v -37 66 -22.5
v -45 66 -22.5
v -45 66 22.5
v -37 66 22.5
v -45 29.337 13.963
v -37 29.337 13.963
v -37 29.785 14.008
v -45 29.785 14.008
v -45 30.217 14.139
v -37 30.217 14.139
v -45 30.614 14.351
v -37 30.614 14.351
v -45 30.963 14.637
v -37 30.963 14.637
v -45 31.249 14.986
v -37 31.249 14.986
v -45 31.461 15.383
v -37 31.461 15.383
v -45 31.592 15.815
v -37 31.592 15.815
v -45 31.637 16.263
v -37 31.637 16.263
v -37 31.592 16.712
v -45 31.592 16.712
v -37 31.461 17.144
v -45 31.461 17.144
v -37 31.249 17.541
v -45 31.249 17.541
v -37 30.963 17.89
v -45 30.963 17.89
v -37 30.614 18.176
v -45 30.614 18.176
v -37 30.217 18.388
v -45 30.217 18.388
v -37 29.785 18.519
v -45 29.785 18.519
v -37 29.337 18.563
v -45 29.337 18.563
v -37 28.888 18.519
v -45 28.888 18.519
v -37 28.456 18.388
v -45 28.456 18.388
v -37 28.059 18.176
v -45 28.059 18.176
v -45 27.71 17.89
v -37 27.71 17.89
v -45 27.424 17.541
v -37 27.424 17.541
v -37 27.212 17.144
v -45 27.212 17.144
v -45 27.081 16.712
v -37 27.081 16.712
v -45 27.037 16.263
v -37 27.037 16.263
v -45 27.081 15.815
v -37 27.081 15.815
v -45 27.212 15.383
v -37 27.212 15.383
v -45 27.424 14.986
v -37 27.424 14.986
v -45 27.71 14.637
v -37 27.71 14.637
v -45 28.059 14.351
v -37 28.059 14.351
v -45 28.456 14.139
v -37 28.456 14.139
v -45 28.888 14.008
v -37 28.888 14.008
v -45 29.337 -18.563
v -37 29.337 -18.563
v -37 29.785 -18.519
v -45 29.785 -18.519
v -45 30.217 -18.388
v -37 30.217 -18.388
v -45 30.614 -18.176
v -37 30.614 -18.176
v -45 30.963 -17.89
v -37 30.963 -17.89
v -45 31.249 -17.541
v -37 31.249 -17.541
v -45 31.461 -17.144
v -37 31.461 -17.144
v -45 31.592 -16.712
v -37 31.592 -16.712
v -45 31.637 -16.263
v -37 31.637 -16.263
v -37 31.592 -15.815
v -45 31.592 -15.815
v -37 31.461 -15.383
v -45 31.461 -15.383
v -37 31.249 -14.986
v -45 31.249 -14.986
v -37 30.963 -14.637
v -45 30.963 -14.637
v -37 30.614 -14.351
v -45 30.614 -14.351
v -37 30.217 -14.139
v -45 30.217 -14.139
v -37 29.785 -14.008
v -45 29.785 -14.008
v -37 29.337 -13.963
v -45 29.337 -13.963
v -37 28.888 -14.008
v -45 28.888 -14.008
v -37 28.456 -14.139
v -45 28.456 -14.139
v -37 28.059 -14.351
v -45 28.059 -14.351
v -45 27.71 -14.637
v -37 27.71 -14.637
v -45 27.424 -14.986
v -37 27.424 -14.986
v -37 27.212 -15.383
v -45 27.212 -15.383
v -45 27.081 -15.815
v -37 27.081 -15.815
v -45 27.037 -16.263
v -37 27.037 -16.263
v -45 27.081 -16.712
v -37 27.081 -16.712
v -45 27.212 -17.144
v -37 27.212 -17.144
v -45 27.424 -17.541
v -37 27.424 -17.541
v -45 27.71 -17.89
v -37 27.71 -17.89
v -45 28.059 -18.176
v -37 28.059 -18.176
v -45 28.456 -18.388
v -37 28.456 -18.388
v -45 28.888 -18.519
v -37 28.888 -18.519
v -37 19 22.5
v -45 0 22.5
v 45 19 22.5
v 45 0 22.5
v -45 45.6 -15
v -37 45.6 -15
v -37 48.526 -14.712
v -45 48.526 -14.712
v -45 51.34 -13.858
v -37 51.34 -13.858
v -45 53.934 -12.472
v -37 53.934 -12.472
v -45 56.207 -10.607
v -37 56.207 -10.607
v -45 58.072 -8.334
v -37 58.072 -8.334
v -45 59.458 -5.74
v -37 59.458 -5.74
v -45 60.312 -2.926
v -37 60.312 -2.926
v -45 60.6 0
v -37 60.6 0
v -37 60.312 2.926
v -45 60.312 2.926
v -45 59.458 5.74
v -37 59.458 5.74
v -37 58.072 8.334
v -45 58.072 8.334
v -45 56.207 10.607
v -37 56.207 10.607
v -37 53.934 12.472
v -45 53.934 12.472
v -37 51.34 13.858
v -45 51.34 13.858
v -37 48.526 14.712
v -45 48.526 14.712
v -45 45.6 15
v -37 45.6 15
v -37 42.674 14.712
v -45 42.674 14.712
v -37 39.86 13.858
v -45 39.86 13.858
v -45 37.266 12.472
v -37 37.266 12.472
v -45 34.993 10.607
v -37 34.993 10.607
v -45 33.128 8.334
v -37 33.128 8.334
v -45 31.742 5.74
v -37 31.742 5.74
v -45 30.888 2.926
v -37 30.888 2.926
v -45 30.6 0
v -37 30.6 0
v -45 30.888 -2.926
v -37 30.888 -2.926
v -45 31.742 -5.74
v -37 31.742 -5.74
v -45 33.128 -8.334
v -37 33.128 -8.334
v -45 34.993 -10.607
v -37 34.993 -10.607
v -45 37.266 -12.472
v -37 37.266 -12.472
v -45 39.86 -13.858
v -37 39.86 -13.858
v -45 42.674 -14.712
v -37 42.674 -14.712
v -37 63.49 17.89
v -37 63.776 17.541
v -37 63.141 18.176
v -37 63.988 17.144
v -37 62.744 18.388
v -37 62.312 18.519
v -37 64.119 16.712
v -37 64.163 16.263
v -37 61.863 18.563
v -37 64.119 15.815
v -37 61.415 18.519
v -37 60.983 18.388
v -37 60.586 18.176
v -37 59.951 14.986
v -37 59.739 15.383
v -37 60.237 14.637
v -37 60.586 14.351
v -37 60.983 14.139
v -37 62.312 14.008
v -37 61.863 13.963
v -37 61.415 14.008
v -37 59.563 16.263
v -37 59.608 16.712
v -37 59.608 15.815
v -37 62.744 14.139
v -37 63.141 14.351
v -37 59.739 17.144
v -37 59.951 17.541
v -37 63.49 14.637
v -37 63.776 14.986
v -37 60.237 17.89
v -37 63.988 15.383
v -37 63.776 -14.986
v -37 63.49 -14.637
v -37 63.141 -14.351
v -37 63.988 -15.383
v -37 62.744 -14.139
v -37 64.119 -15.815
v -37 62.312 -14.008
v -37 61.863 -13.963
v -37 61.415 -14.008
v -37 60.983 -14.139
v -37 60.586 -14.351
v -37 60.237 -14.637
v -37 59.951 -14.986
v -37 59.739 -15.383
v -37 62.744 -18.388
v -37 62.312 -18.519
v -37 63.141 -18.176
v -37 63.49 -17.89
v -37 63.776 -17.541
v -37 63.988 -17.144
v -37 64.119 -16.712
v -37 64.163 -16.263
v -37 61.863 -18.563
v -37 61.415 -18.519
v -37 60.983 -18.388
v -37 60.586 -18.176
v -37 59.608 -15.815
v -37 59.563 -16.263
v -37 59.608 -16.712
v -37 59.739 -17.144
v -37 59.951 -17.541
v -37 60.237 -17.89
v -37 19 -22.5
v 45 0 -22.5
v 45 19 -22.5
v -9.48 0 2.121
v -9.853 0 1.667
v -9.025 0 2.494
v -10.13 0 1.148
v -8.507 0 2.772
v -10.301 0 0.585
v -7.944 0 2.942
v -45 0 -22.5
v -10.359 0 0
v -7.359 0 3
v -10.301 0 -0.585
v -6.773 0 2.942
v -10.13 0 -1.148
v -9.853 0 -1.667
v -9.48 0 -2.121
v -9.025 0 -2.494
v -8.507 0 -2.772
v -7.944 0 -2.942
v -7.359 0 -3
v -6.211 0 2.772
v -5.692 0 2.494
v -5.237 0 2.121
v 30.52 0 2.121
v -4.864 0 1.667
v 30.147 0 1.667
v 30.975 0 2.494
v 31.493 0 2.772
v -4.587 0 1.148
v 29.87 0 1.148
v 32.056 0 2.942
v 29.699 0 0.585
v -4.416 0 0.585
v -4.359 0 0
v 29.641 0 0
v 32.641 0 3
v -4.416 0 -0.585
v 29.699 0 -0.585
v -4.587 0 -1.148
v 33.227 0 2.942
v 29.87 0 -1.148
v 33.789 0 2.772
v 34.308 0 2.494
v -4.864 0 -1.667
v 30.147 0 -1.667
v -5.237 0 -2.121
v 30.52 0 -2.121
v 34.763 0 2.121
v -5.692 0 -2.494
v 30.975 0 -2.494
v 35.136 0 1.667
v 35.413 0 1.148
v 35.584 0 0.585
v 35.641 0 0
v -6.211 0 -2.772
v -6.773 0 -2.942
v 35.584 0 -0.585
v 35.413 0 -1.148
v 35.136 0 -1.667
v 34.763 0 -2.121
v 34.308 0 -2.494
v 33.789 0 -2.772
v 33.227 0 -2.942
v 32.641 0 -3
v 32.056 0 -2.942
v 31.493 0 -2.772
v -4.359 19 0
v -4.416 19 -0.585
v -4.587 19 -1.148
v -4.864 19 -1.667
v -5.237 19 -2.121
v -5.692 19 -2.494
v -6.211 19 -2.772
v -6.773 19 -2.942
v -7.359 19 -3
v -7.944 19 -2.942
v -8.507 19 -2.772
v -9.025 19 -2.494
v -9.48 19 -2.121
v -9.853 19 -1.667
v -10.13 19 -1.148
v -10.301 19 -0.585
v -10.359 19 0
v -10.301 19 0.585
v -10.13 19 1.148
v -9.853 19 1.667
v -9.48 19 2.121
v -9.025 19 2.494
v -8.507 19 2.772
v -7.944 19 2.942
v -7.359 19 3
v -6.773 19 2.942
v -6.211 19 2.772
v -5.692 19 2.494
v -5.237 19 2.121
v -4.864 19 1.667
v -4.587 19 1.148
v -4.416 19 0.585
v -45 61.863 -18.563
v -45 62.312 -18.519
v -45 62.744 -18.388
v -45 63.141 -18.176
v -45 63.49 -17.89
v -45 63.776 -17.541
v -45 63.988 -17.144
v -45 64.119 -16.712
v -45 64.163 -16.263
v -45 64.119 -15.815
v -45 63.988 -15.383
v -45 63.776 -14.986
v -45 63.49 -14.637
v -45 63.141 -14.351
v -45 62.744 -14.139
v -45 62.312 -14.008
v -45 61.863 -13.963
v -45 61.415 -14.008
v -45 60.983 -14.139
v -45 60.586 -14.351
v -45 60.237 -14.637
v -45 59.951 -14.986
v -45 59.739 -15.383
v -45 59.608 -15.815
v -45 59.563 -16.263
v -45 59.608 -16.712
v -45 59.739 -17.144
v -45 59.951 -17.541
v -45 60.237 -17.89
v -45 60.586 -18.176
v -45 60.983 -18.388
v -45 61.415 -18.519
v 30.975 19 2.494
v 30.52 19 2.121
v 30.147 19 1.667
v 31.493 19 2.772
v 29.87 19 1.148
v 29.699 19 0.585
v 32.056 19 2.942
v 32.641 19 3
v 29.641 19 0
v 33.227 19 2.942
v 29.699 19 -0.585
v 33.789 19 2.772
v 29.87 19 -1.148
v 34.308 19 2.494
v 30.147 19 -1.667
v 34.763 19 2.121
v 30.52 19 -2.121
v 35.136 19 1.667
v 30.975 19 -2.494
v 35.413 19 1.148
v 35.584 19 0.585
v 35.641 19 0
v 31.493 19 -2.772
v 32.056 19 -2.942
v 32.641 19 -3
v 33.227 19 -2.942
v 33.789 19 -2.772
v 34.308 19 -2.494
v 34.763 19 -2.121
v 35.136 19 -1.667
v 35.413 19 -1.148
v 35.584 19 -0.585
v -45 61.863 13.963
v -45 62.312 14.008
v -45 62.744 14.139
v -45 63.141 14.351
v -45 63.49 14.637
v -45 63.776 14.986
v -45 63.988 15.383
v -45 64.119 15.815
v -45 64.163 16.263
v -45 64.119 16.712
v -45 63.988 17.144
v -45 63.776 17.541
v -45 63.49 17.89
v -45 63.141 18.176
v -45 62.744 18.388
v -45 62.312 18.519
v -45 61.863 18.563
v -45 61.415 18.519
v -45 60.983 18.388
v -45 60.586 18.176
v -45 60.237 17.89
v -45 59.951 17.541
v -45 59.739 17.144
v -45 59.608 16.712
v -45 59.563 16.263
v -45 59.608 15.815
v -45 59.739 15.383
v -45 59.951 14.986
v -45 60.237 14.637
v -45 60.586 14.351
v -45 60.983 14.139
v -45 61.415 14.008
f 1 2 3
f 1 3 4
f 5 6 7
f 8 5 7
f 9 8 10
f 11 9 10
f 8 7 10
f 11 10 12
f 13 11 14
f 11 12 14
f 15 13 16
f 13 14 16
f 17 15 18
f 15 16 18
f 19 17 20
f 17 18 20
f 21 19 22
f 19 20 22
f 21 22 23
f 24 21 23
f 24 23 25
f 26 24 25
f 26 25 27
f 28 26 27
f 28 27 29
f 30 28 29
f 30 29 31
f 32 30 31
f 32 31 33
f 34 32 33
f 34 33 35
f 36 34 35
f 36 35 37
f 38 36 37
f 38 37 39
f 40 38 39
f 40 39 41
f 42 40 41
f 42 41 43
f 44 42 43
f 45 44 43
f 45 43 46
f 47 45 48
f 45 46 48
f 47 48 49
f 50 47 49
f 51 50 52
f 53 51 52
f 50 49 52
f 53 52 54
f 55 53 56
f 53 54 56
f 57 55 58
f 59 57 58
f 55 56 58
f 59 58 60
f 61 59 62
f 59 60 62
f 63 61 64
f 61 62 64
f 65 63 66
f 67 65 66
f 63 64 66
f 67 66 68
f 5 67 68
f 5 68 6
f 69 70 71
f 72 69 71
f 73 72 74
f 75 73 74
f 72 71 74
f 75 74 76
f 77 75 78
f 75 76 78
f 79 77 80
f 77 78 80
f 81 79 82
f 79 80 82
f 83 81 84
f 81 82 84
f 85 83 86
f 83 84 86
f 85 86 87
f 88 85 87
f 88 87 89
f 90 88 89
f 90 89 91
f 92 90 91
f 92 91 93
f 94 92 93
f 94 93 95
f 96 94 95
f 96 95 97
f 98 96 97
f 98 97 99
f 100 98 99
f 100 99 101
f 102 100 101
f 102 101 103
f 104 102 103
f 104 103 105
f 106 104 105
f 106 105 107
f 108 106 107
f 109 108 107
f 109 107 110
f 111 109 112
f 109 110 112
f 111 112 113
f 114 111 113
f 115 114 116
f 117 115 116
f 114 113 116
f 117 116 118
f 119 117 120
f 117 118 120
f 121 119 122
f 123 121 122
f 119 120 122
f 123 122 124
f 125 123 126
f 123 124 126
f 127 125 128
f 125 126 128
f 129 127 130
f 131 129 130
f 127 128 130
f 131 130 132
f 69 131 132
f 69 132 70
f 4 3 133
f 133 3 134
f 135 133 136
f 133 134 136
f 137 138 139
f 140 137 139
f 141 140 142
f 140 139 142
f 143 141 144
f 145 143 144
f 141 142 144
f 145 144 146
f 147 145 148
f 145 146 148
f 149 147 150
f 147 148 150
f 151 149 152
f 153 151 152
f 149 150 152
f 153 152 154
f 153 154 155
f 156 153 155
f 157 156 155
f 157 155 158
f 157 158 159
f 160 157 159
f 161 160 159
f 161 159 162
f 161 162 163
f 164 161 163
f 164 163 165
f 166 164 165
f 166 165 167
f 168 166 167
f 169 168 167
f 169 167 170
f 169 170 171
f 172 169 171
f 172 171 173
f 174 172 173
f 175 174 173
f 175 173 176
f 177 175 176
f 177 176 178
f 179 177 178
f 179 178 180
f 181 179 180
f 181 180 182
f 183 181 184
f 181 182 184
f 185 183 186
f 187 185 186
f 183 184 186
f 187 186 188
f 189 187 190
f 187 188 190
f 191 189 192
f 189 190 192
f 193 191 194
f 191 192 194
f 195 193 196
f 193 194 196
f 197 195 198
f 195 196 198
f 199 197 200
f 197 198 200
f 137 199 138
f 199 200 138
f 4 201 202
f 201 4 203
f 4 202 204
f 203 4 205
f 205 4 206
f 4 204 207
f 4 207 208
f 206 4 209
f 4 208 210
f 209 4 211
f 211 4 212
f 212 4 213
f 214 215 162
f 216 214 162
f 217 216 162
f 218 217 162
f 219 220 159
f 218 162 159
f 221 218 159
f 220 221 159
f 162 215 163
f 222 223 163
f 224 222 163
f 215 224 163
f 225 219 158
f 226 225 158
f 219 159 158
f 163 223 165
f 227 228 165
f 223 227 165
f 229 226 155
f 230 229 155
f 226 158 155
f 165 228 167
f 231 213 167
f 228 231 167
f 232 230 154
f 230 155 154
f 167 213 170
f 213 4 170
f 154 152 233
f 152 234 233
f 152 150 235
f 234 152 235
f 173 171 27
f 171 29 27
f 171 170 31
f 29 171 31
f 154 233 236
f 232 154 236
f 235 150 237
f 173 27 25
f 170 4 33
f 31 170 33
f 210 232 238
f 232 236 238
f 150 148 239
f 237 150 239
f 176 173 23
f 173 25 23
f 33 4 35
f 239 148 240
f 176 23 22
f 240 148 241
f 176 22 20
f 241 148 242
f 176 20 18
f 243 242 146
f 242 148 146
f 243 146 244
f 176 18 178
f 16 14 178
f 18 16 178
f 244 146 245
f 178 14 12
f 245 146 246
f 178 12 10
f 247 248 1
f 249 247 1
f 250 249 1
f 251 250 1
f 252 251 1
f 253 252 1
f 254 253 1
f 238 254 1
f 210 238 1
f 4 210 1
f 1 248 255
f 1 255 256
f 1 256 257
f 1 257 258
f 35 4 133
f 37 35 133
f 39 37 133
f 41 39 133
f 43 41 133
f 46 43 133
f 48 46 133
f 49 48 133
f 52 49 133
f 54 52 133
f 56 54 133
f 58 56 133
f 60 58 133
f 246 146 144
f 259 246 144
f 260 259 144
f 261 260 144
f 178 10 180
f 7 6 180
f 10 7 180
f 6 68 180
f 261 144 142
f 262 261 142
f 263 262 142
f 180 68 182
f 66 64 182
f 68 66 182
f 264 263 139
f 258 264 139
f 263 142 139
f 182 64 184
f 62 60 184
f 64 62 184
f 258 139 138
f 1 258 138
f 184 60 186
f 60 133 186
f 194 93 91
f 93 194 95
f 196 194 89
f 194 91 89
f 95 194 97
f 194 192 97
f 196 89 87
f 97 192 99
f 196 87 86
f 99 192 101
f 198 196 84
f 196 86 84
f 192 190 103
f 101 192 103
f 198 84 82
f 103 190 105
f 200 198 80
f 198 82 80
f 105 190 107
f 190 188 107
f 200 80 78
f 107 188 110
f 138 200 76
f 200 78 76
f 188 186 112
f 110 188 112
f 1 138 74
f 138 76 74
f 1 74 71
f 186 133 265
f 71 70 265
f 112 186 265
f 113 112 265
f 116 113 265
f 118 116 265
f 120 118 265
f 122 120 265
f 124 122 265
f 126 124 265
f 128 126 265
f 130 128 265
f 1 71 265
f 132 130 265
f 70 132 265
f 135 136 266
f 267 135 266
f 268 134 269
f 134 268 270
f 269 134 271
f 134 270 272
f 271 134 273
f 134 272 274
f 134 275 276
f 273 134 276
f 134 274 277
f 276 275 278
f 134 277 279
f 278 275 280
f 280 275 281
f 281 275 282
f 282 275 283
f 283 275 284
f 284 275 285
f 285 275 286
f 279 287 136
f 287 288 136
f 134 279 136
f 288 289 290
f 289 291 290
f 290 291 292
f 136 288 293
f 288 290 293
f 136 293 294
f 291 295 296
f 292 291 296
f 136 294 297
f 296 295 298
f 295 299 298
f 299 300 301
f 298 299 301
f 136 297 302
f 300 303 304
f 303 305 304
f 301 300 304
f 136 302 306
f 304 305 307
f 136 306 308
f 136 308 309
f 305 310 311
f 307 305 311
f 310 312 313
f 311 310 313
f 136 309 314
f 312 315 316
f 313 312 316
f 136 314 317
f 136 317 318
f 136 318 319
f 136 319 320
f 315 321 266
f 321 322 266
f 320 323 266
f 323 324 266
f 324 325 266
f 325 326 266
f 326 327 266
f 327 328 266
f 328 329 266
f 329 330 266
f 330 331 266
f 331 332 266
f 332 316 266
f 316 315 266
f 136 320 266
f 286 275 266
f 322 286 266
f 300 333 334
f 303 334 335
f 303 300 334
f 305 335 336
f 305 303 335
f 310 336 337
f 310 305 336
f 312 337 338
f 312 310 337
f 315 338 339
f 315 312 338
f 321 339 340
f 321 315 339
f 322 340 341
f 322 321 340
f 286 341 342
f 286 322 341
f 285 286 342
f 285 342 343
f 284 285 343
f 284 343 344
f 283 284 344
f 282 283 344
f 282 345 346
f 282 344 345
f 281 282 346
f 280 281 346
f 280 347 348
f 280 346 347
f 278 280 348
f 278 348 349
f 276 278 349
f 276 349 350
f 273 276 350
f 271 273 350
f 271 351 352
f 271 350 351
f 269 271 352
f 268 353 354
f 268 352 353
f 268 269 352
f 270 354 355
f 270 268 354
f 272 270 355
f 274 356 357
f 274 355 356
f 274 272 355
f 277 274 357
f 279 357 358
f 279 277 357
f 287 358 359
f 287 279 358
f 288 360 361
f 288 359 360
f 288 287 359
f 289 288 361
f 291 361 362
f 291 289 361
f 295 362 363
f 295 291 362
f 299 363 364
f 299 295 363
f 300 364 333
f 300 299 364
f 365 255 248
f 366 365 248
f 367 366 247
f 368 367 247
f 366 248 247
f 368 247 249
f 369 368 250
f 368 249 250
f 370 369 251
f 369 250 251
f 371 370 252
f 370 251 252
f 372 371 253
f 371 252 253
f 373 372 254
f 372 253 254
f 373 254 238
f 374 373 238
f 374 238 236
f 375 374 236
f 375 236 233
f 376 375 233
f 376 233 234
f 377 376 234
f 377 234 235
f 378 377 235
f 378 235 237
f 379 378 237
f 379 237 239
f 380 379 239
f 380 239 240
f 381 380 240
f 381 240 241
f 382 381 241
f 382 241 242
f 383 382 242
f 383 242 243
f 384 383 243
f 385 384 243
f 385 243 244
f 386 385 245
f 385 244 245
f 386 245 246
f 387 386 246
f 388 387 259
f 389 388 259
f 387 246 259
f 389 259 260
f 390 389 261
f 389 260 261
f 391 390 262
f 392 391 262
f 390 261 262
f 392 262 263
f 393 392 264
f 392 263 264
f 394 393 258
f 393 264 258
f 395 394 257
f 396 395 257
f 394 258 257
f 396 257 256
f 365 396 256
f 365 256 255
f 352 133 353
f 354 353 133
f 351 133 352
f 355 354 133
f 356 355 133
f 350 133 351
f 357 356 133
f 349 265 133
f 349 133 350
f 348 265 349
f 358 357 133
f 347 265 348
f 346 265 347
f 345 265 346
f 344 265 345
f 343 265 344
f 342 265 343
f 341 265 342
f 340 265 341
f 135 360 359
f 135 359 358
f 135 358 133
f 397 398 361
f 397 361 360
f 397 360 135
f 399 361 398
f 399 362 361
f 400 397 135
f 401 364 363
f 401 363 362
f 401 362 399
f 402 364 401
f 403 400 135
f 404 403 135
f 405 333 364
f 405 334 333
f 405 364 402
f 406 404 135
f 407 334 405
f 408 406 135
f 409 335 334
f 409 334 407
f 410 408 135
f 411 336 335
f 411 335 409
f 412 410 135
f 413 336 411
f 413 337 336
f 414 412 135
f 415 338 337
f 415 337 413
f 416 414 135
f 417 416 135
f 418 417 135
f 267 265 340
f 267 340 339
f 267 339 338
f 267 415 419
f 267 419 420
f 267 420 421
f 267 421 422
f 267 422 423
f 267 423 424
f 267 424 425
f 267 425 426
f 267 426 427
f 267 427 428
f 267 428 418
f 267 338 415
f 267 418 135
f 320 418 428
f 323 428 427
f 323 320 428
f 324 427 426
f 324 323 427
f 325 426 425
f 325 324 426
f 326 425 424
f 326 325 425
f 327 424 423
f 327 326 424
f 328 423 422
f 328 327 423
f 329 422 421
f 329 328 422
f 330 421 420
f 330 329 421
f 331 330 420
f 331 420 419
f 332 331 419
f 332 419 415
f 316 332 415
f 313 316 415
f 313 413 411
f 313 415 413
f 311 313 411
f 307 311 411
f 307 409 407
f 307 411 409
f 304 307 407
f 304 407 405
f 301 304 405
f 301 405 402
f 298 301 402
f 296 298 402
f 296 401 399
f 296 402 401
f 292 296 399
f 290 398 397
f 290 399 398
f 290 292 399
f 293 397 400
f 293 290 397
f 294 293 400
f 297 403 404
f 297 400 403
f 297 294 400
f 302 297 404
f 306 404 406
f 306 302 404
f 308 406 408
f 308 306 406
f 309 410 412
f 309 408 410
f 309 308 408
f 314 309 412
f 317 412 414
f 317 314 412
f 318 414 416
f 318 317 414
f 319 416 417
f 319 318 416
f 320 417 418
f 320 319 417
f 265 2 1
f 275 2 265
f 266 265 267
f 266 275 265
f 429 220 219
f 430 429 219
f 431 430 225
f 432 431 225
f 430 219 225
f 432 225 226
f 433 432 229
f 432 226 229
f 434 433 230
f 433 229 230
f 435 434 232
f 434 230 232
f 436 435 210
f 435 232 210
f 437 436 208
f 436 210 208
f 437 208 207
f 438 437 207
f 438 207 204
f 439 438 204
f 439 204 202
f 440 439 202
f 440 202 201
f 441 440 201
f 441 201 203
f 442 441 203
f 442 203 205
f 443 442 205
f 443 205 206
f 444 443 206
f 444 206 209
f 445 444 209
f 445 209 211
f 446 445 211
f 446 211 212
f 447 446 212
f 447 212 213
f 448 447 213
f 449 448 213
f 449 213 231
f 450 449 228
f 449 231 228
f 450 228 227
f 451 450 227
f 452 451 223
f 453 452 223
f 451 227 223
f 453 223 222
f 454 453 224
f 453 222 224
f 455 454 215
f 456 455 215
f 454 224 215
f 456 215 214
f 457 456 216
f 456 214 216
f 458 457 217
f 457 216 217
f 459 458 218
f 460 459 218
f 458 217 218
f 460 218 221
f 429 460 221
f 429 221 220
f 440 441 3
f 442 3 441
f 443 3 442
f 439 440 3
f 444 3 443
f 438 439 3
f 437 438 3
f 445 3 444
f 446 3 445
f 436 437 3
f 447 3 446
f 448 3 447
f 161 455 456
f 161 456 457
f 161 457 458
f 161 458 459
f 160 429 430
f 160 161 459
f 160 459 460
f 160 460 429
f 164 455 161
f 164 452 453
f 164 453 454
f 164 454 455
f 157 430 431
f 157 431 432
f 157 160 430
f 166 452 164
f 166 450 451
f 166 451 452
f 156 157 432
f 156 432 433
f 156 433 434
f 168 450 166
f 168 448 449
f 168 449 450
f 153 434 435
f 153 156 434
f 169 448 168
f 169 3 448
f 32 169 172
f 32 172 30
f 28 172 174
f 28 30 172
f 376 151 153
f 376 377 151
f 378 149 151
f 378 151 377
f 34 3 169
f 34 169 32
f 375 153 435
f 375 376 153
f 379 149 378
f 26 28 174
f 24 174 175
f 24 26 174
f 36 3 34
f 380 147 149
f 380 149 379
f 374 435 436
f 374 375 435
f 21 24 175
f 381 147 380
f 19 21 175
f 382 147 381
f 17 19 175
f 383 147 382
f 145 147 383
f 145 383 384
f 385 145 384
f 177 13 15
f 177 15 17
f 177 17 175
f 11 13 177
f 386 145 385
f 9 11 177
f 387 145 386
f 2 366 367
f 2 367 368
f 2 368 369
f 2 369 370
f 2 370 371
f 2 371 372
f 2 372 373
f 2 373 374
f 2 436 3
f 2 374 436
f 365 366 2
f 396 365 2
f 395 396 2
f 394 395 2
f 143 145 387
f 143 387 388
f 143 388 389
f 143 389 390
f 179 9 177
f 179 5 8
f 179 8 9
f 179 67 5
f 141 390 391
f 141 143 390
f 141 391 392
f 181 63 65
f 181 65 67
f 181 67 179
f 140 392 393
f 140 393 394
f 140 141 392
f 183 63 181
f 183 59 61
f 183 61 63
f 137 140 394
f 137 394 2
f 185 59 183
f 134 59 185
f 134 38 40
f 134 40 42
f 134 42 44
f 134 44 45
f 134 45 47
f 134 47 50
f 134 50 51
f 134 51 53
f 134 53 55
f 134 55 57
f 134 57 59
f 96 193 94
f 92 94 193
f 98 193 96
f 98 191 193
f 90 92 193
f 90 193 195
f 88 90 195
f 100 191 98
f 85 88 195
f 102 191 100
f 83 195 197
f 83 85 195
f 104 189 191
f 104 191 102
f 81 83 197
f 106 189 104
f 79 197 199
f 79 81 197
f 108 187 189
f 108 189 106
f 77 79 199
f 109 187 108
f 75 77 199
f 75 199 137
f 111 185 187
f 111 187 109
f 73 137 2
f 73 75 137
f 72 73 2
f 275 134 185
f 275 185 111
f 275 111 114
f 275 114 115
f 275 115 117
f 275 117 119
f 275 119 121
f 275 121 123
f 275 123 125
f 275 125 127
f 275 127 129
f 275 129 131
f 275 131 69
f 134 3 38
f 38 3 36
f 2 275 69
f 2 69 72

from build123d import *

# Parameters (mm, degrees)
SKETCH1_W           = 90
SKETCH1_H           = 45
BOSS_EXTRUDE1_DEPTH = 5
SKETCH2_W           = 8
SKETCH2_H           = 45
BOSS_EXTRUDE2_DEPTH = 66
SKETCH4_W           = 82
SKETCH4_H           = 45
BOSS_EXTRUDE3_DEPTH = 19
SKETCH5_R           = 15
SKETCH5_R_2         = 2.3
CUT_EXTRUDE1_DEPTH  = 55
SKETCH6_R           = 3
CUT_EXTRUDE2_DEPTH  = 55


with BuildPart() as part:
    # Sketch1 → Boss-Extrude1 (new body)
    with BuildSketch(Plane(origin=(0, 0, 0), x_dir=(1, 0, 0), z_dir=(0, 1, 0))):
        Rectangle(SKETCH1_W, SKETCH1_H)
    extrude(amount=BOSS_EXTRUDE1_DEPTH)

    # Sketch2 → Boss-Extrude2 (add)
    with BuildSketch(Plane(origin=(0, 0, 0), x_dir=(1, 0, 0), z_dir=(0, 1, 0))):
        with Locations((-41, 0)):
            Rectangle(SKETCH2_W, SKETCH2_H)
    extrude(amount=BOSS_EXTRUDE2_DEPTH)

    # Sketch4 → Boss-Extrude3 (add)
    with BuildSketch(Plane(origin=(0, 0, 0), x_dir=(1, 0, 0), z_dir=(0, 1, 0))):
        with Locations((4, 0)):
            Rectangle(SKETCH4_W, SKETCH4_H)
    extrude(amount=BOSS_EXTRUDE3_DEPTH)

    # Sketch5 → Cut-Extrude1 (cut)
    with BuildSketch(Plane(origin=(0, 0, 0), x_dir=(0, 0, -1), z_dir=(1, 0, 0))):
        with Locations((0, 45.6)):
            Circle(SKETCH5_R)
        with Locations((16.263455967, 61.863455967)):
            Circle(SKETCH5_R_2)
        with Locations((16.263455967, 29.336544033)):
            Circle(SKETCH5_R_2)
        with Locations((-16.263455967, 29.336544033)):
            Circle(SKETCH5_R_2)
        with Locations((-16.263455967, 61.863455967)):
            Circle(SKETCH5_R_2)
    extrude(amount=-CUT_EXTRUDE1_DEPTH, mode=Mode.SUBTRACT)

    # Sketch6 → Cut-Extrude2 (cut)
    with BuildSketch(Plane(origin=(0, 0, 0), x_dir=(1, 0, 0), z_dir=(0, 1, 0))):
        with Locations((32.641263943, 0)):
            Circle(SKETCH6_R)
        with Locations((-7.358736057, 0)):
            Circle(SKETCH6_R)
    extrude(amount=CUT_EXTRUDE2_DEPTH, mode=Mode.SUBTRACT)


solid = part.part
